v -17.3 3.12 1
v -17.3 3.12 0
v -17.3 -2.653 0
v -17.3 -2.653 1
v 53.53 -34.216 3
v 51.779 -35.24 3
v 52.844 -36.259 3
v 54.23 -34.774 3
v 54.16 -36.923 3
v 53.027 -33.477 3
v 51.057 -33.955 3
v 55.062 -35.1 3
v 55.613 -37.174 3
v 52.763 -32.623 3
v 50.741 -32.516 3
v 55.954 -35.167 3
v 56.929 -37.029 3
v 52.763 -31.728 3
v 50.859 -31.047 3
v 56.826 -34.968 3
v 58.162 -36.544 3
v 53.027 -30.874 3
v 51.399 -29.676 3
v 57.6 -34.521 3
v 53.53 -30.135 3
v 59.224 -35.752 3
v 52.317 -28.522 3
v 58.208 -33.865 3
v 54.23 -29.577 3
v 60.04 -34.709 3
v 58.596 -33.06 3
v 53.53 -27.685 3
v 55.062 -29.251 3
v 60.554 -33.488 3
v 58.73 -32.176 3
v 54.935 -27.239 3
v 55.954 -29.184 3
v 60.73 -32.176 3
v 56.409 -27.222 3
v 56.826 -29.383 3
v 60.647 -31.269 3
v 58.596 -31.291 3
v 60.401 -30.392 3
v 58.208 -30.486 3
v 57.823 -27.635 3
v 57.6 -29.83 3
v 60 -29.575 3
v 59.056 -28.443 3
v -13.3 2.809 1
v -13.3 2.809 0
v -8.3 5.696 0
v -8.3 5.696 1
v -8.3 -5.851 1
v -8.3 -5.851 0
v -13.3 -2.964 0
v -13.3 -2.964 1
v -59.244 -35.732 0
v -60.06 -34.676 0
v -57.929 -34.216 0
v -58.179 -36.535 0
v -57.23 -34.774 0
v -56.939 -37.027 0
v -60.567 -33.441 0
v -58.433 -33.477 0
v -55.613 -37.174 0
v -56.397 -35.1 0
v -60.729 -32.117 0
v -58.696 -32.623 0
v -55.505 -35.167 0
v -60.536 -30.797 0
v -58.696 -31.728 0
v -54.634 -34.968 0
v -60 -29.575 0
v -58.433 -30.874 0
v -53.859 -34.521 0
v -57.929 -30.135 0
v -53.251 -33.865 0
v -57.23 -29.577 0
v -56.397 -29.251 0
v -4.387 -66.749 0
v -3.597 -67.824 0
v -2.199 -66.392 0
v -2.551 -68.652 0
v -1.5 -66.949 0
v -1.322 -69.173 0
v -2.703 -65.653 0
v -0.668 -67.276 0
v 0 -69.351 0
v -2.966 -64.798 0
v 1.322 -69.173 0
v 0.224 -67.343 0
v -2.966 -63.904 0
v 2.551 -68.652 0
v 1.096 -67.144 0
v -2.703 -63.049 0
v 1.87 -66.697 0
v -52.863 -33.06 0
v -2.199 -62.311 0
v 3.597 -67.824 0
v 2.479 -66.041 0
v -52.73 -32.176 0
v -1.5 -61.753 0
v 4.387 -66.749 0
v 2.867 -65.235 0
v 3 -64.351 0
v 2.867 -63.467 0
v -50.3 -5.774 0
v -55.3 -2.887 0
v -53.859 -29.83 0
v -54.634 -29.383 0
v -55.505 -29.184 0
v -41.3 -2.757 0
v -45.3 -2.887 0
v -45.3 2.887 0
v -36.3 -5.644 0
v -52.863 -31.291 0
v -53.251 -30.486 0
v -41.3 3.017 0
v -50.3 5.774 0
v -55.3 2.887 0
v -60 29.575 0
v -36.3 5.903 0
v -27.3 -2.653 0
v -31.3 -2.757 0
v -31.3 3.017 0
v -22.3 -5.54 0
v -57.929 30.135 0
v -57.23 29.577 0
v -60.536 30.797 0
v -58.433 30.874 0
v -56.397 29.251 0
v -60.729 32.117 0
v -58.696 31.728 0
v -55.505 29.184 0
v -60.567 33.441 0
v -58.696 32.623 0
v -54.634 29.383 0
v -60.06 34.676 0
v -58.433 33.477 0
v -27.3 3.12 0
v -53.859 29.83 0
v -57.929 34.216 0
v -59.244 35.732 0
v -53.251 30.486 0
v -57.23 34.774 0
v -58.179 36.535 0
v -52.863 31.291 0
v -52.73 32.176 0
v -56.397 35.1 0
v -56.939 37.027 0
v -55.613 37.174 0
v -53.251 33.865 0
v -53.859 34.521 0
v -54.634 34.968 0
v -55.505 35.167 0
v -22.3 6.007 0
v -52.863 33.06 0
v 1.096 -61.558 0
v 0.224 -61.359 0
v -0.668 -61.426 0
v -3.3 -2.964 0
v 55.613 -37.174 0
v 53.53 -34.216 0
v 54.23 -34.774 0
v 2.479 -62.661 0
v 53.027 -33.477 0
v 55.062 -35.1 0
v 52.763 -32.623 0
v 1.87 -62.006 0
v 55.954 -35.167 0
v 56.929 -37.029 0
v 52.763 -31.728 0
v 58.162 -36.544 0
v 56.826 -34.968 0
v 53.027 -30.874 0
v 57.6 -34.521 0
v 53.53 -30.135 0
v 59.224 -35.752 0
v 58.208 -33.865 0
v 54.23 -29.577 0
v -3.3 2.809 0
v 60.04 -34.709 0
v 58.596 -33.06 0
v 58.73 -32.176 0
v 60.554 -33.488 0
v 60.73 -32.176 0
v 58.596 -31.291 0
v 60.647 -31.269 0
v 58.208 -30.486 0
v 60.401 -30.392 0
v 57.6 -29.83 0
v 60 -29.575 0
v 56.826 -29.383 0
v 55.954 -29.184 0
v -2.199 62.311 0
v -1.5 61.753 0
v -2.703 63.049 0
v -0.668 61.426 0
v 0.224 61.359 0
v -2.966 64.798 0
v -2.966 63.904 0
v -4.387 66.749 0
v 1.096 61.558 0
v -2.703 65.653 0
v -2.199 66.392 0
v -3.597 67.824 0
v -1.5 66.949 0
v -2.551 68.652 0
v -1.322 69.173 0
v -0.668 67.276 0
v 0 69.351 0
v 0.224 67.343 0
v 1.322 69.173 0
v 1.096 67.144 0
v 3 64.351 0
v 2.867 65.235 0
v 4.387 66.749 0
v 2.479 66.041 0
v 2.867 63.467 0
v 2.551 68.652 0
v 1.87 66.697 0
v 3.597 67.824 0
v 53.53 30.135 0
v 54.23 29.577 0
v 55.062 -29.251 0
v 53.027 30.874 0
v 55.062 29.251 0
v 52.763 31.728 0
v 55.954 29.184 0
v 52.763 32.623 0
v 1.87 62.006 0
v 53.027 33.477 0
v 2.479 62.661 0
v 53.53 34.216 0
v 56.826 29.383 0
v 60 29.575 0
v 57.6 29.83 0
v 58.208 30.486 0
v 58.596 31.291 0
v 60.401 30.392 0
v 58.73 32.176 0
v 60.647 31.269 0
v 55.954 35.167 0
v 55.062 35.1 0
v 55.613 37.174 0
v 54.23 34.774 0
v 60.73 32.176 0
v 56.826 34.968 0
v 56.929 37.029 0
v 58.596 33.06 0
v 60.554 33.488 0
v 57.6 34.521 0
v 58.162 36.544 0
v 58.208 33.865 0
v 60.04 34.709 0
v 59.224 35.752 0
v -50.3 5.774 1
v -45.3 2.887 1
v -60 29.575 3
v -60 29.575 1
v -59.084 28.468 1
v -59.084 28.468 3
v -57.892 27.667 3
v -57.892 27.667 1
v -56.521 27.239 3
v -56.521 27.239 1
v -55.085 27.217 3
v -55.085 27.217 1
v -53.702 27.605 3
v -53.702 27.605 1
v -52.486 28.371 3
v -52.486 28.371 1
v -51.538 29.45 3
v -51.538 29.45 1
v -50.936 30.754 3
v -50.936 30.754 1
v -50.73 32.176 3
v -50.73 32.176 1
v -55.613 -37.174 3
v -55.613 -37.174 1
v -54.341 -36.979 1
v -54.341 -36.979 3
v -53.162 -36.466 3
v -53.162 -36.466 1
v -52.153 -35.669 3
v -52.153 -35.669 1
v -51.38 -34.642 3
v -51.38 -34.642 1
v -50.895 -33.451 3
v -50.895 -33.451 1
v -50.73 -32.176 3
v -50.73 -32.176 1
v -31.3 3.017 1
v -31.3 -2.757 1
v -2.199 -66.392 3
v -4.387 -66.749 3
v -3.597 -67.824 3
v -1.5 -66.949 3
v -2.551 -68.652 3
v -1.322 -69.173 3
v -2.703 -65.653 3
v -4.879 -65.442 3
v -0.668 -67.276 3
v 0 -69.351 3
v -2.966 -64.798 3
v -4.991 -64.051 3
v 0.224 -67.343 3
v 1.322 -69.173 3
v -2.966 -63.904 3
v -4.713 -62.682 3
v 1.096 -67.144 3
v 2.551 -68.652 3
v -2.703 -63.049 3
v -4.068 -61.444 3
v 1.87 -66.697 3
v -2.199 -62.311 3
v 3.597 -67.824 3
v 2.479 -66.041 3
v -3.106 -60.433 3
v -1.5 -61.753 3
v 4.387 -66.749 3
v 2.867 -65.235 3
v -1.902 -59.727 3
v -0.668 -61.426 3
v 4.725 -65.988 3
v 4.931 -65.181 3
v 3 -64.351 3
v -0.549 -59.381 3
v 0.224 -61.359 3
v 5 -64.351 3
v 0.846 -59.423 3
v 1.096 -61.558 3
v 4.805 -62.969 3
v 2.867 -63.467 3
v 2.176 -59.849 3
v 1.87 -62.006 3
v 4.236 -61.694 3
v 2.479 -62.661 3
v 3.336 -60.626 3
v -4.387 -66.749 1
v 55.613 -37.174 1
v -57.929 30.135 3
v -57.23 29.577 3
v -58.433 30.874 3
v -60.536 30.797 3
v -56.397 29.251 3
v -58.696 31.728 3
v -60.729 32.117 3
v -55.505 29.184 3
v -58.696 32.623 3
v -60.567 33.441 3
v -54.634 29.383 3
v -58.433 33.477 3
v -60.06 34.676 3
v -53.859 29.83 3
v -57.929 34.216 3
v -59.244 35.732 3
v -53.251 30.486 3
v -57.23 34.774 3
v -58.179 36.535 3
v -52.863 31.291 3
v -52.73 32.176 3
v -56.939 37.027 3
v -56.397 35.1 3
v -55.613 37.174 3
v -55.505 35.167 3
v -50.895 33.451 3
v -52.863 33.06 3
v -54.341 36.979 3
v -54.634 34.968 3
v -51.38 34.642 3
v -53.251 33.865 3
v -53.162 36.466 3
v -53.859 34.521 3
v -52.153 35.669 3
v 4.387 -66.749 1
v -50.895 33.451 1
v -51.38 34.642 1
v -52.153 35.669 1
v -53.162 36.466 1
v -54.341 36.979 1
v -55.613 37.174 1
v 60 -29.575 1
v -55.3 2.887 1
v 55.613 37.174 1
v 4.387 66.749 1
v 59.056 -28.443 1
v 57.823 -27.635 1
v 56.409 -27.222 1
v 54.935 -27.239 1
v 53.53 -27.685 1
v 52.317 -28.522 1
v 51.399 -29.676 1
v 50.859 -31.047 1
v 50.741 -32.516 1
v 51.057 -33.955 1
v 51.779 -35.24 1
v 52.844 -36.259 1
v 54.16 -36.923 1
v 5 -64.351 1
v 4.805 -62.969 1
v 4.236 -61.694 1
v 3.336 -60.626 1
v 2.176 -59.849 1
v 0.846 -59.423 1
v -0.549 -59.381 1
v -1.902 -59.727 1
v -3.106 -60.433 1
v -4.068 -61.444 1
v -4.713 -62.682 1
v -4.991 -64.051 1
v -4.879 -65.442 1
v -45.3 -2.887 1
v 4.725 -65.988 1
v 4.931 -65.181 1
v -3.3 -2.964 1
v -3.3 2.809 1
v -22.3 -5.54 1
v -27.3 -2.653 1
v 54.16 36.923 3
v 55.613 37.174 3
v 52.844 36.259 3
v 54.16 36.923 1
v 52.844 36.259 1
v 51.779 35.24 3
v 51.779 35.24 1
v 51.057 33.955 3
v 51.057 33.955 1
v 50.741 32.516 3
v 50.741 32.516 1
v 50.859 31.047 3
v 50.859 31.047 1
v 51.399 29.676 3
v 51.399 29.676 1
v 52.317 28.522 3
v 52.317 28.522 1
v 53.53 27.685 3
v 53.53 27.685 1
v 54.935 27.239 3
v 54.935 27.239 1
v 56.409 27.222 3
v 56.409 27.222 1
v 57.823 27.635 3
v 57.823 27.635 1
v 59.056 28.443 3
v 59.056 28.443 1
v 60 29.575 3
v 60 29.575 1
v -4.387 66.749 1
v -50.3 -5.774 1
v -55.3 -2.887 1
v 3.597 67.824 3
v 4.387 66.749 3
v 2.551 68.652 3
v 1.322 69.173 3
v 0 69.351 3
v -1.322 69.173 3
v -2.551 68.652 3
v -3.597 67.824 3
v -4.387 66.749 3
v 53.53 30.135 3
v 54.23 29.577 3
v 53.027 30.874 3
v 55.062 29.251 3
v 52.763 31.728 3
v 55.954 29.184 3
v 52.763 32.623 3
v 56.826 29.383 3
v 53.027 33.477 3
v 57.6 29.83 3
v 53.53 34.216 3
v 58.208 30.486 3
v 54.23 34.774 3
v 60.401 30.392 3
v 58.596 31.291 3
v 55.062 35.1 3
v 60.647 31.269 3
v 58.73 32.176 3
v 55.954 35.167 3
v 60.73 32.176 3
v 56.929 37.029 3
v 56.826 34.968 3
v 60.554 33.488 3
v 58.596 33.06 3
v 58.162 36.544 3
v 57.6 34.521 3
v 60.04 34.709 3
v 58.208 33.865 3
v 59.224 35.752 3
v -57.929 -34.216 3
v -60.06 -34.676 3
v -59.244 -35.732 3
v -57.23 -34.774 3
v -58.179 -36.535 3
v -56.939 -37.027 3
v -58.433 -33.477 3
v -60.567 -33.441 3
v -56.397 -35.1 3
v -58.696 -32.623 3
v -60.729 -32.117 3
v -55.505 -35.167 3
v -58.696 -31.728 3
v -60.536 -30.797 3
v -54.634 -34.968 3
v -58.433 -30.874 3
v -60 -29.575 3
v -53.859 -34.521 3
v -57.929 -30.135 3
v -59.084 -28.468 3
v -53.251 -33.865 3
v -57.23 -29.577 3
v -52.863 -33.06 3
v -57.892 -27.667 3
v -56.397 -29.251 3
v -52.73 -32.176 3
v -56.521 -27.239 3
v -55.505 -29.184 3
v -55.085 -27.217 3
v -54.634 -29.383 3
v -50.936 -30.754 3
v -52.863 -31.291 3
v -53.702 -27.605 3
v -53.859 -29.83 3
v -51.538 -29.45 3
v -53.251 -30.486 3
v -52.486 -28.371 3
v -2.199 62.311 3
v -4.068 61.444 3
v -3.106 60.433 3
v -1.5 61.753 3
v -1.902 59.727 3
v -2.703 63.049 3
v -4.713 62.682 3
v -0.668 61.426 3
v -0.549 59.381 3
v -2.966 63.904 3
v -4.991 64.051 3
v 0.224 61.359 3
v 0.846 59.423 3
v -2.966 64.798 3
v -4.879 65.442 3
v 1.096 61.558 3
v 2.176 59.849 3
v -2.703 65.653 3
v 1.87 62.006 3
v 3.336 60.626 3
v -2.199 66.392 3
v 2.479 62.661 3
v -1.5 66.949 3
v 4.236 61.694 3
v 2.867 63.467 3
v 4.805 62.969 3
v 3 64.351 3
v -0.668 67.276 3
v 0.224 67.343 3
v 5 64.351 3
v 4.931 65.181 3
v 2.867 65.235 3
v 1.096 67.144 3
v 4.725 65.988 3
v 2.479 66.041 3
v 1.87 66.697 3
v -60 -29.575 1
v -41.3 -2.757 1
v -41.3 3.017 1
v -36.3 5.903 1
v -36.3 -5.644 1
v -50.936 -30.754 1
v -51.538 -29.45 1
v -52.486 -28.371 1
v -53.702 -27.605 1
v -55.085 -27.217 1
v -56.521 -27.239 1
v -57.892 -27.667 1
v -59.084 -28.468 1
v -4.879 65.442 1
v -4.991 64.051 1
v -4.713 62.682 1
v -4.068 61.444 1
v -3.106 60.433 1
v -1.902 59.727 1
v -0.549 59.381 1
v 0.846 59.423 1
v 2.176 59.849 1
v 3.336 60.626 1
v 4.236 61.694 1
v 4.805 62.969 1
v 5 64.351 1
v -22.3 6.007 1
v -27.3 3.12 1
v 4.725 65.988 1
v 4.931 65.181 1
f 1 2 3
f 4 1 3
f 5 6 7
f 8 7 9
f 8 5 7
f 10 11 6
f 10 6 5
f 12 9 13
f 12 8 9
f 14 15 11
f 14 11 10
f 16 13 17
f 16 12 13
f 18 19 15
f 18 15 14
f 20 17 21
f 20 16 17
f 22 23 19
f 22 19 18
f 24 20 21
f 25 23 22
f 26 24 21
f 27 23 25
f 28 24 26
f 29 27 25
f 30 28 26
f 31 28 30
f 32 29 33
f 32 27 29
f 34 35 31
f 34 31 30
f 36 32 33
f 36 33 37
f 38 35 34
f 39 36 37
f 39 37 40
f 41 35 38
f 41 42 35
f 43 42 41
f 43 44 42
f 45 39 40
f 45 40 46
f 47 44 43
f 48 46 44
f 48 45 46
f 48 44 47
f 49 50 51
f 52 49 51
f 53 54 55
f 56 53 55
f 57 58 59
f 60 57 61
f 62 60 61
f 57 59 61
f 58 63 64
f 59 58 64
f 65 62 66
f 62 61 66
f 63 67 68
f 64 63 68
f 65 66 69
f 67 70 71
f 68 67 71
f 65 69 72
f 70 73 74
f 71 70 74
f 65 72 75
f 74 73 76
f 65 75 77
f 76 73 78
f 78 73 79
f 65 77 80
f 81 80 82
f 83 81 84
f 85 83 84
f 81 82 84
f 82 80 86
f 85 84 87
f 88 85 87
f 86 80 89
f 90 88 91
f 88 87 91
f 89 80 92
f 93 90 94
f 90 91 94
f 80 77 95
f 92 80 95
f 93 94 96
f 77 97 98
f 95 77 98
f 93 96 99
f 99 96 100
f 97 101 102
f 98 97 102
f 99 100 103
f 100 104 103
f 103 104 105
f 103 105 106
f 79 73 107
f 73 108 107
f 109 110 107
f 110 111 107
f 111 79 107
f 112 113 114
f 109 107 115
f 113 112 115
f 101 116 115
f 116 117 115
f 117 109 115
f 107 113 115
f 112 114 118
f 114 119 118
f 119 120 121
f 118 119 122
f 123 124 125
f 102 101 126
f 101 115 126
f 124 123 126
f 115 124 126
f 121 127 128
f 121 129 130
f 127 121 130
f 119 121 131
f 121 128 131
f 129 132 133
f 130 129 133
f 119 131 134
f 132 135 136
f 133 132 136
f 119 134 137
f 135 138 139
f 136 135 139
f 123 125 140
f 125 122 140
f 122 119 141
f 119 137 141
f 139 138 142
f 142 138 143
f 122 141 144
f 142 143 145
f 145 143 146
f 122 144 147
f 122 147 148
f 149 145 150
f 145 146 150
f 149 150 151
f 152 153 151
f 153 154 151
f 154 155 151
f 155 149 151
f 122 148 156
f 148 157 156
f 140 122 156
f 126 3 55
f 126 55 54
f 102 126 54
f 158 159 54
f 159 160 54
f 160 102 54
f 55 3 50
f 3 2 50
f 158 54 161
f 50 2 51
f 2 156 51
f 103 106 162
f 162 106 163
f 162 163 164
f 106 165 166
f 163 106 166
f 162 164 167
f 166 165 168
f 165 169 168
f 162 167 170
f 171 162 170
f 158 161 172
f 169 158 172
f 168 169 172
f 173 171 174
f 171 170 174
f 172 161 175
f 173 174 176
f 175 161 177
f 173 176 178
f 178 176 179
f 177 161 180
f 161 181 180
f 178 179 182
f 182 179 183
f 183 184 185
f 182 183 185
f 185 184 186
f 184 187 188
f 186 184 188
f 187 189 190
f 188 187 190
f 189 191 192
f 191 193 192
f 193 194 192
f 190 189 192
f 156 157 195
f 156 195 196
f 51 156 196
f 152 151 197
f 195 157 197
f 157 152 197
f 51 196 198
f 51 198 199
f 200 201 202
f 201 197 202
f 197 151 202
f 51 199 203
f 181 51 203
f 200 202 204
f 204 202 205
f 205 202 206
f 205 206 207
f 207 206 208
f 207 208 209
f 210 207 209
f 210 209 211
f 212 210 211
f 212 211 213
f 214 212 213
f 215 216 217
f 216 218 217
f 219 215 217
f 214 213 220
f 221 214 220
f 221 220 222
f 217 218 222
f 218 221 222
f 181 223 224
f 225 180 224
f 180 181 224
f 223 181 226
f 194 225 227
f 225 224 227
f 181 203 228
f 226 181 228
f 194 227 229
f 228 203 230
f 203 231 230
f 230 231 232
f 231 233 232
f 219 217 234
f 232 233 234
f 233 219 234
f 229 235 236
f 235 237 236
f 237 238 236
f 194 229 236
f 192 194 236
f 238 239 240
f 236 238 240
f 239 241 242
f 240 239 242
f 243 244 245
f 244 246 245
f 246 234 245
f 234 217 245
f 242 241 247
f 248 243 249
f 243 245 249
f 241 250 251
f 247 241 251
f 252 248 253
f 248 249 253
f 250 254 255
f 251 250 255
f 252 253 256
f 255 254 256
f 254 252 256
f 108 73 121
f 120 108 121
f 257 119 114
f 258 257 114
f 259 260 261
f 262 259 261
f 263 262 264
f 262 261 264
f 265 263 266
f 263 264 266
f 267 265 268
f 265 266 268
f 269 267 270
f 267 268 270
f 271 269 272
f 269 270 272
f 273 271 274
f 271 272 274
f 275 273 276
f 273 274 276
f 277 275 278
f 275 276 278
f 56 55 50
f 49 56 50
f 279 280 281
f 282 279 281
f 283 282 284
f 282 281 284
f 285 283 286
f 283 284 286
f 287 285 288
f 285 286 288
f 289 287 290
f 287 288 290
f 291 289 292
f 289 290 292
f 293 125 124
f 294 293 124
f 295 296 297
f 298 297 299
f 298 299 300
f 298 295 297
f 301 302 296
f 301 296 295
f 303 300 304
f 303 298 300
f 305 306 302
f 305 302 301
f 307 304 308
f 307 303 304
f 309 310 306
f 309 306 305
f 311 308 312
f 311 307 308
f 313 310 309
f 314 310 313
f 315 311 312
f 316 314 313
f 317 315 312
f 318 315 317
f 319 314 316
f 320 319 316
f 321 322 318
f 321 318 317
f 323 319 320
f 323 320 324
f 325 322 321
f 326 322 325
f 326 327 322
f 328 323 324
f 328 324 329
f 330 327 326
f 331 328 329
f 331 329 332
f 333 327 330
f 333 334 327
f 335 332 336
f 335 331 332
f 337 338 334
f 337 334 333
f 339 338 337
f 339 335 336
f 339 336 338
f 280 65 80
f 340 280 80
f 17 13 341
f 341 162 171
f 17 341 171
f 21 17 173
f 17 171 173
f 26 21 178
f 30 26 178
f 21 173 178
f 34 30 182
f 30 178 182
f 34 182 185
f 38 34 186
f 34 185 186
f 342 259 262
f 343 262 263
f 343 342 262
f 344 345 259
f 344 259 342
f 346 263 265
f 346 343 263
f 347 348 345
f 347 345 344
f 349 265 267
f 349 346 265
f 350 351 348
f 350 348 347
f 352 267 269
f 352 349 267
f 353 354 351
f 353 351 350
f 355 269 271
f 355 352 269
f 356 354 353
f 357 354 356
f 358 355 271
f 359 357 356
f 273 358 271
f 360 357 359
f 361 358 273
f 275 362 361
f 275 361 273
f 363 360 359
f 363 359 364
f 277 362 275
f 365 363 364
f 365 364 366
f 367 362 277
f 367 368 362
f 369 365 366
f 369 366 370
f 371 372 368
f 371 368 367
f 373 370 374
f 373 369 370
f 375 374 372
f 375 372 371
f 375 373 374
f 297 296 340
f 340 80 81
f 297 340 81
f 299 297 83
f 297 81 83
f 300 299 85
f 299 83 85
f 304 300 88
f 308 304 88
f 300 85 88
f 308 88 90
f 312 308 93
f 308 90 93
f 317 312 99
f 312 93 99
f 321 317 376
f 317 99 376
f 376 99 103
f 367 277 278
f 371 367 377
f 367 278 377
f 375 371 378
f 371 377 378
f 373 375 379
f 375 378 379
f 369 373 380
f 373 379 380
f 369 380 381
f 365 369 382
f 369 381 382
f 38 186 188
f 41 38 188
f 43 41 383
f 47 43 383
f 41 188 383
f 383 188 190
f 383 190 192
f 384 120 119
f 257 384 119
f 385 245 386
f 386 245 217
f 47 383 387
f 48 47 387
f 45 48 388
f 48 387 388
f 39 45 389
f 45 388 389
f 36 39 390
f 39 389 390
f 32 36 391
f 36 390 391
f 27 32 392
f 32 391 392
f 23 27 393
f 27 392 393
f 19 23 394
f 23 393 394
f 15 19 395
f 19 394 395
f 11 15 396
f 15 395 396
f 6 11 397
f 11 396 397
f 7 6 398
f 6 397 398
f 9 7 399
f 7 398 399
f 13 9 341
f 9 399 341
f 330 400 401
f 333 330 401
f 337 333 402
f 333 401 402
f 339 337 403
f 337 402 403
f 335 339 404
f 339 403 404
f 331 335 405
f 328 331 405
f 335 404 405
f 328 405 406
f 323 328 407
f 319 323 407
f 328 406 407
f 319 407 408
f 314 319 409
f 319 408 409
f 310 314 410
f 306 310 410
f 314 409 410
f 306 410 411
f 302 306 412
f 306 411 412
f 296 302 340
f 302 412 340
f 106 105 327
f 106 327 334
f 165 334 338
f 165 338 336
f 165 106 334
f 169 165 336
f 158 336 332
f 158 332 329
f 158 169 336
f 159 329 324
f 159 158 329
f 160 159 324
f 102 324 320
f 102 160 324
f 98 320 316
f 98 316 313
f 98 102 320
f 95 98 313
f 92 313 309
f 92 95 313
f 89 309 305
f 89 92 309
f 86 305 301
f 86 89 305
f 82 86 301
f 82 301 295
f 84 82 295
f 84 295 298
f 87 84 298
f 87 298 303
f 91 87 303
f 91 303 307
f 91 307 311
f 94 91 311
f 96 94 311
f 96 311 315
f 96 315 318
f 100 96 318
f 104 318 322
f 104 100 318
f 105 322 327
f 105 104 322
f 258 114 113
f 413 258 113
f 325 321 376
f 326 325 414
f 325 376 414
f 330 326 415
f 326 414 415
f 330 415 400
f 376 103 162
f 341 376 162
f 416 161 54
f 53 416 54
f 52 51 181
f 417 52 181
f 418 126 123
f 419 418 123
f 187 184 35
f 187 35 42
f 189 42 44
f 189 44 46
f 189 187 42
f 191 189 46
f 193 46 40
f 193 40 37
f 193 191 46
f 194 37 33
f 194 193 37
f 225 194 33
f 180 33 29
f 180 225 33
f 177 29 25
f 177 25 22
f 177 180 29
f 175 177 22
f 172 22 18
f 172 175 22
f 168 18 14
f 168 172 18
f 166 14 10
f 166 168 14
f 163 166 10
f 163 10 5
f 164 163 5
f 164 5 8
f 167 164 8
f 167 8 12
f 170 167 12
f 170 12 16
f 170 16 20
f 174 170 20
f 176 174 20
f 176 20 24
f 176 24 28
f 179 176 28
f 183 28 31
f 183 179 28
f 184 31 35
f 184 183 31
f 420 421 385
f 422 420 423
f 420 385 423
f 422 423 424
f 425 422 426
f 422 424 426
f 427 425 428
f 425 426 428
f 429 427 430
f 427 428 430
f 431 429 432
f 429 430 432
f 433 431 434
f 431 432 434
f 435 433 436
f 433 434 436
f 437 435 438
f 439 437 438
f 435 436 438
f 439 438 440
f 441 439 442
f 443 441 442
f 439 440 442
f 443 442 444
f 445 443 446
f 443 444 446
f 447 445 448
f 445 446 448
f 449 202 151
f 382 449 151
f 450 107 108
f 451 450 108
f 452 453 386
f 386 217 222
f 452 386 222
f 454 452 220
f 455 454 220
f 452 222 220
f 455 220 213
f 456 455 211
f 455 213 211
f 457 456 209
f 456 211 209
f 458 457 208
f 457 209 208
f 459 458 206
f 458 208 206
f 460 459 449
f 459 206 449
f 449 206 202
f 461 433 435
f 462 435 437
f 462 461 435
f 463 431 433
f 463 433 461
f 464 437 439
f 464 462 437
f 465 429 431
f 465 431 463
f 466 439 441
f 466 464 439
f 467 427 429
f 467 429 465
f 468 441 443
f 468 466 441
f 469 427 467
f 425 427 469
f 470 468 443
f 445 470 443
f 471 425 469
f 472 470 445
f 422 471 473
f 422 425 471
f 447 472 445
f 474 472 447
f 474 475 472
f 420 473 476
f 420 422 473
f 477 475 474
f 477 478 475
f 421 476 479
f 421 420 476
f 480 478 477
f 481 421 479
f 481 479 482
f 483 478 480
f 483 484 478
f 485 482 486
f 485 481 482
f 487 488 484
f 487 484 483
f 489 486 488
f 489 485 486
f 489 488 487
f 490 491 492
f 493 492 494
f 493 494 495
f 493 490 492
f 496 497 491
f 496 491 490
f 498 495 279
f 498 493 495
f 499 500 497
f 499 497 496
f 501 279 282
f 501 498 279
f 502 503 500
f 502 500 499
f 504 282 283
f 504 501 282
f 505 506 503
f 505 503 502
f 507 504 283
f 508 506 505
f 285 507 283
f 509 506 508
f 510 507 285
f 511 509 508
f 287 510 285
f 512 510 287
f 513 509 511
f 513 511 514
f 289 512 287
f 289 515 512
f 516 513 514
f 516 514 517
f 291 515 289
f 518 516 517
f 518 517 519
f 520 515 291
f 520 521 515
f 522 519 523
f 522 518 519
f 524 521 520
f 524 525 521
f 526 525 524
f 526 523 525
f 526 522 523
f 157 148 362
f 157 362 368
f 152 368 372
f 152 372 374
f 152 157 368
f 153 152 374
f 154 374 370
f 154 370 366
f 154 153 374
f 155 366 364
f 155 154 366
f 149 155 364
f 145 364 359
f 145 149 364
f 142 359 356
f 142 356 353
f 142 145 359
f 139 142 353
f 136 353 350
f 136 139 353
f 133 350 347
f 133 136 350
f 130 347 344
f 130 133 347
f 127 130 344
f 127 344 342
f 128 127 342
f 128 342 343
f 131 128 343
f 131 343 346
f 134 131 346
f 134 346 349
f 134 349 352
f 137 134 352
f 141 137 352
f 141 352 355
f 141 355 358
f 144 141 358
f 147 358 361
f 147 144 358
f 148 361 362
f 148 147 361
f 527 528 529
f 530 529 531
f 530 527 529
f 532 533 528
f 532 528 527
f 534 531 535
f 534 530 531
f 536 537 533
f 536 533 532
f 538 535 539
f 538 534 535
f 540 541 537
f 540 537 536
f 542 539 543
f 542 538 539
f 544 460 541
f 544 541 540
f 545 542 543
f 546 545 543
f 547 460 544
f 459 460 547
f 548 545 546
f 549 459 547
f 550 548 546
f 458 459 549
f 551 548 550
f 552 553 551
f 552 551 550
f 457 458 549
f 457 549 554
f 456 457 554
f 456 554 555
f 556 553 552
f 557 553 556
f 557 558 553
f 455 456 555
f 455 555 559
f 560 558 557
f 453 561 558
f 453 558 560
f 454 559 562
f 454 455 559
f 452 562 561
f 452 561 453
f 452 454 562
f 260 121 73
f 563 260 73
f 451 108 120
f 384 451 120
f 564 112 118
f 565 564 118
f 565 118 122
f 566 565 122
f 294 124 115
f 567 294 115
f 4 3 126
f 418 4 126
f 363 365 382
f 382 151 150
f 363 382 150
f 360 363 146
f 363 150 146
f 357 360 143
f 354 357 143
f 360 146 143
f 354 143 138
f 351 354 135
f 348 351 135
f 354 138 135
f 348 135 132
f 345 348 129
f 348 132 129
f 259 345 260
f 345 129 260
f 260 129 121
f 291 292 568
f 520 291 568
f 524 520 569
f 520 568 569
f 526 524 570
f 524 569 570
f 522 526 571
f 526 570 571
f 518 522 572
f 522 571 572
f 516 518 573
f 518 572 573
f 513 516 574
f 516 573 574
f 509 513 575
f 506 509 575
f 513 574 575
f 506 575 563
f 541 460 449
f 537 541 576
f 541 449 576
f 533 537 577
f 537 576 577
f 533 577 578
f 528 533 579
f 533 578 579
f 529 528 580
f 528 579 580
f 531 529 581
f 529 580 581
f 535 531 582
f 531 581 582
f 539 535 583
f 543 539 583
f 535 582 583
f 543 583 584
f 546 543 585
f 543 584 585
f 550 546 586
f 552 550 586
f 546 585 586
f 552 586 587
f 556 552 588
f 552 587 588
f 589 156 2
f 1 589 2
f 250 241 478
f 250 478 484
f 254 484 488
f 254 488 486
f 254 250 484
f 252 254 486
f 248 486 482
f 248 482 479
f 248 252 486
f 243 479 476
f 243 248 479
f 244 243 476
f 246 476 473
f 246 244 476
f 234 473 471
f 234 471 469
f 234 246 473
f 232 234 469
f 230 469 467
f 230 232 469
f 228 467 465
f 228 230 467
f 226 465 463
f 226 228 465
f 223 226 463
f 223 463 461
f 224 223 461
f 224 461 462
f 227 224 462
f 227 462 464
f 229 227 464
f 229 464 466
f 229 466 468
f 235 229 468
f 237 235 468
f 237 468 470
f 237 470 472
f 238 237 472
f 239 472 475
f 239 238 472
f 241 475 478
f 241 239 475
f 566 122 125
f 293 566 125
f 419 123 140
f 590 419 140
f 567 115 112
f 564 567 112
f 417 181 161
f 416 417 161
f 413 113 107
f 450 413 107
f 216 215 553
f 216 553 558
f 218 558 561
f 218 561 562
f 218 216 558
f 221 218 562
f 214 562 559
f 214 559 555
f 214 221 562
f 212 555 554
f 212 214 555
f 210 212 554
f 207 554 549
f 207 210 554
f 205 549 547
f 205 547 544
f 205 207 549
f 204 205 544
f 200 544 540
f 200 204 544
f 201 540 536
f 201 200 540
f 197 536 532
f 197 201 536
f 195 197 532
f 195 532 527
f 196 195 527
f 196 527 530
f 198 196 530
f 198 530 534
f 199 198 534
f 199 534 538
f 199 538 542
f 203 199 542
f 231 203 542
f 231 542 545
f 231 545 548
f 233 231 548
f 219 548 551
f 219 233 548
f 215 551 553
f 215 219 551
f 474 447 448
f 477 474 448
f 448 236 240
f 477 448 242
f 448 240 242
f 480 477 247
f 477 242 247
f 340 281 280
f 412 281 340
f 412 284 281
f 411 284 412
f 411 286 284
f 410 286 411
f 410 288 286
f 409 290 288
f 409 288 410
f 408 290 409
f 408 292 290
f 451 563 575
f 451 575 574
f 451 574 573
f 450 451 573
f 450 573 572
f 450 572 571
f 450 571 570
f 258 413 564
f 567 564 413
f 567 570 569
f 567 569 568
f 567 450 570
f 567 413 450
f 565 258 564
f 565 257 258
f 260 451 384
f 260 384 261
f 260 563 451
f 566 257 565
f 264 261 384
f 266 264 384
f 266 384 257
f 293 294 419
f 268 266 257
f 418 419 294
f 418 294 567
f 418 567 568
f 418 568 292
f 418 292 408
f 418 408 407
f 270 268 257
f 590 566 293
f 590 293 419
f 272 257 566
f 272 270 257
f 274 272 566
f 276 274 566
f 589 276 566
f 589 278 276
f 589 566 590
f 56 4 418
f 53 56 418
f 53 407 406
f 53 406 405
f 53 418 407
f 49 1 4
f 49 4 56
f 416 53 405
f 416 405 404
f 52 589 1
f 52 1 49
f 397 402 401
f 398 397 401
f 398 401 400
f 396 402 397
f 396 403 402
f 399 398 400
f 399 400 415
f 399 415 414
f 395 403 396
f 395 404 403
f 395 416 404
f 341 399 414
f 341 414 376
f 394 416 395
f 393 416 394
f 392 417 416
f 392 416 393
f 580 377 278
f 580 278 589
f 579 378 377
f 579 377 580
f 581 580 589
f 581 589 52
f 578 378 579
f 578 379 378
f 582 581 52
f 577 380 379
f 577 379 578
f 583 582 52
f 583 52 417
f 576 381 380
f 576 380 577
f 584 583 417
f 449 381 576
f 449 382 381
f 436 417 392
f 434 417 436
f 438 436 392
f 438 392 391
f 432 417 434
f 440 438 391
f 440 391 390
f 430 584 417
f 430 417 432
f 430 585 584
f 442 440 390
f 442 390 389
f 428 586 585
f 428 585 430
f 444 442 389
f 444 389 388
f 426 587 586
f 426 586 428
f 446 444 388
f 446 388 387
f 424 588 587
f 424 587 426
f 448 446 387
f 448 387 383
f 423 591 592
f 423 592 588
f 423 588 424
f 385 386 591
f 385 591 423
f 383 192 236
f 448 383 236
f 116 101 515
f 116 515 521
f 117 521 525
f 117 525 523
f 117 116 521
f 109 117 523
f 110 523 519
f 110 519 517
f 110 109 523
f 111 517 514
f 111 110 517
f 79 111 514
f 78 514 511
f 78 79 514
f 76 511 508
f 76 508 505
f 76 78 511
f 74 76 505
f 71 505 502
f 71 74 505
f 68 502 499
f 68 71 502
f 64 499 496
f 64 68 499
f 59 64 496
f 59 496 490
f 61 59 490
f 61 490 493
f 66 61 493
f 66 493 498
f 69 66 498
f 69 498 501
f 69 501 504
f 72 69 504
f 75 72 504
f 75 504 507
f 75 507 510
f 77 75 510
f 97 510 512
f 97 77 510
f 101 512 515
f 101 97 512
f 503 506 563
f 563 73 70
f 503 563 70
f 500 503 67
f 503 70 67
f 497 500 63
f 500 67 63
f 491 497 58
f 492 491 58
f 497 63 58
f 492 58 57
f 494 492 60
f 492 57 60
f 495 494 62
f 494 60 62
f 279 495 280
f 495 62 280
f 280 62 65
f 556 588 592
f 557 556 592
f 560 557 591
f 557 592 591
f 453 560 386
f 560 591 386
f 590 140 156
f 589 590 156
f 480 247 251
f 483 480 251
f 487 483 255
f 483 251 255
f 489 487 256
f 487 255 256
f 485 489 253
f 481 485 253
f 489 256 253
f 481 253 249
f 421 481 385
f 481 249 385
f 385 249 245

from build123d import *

# Parameters (mm, degrees)
F1_DEPTH = 1
F0_R     = 3
F2_DEPTH = 3


with BuildPart() as f1:
    # F0 (on Top) → F1 (new body)
    with BuildSketch(Plane.XY):
        with BuildLine():
            Line((60, -29.5747704777), (60, 29.574769431))
            ThreePointArc((60, 29.574769431), (51.3994928411, 29.6755110105), (55.6125027826, 37.1741388509))
            Line((55.6125027826, 37.1741388509), (4.3874976328, 66.7489093634))
            ThreePointArc((4.3874976328, 66.7489093634), (4.844454983, 65.5884611093), (5, 64.351021851))
            ThreePointArc((5, 64.351021851), (-1.2374392583, 59.506566868), (-4.3874976328, 66.7489093634))
            Line((-4.3874976328, 66.7489093634), (-55.6125023294, 37.1741391126))
            ThreePointArc((-55.6125023294, 37.1741391126), (-52.1529183527, 35.6693921891), (-50.7296198931, 32.1755109531))
            ThreePointArc((-50.7296198931, 32.1755109531), (-54.37904604, 27.3613702959), (-60, 29.5747699543))
            Line((-60, 29.5747699543), (-60, -29.5747699543))
            ThreePointArc((-60, -29.5747699543), (-54.3790460573, -27.3613707384), (-50.7296201258, -32.1755113351))
            ThreePointArc((-50.7296201258, -32.1755113351), (-52.152918285, -35.6693922636), (-55.6125017026, -37.1741394744))
            Line((-55.6125017026, -37.1741394744), (-4.3874984862, -66.7489088707))
            ThreePointArc((-4.3874984862, -66.7489088707), (-1.237438708, -59.5065674728), (4.9999998449, -64.351022636))
            ThreePointArc((4.9999998449, -64.351022636), (4.8444549712, -65.5884613333), (4.387498033, -66.7489091323))
            Line((4.387498033, -66.7489091323), (55.6125012494, -37.1741397361))
            ThreePointArc((55.6125012494, -37.1741397361), (51.3994931648, -29.6755112347), (60, -29.5747704777))
        make_face()
        Polygon((-8.3002293408, -5.8508351856), (-13.3002293408, -2.9640838396), (-13.3002293408, 2.8094188523), (-8.3002293408, 5.6961701982), (-3.3002293408, 2.8094188523), (-3.3002293408, -2.9640838396), align=None, mode=Mode.SUBTRACT)
        Polygon((-50.3002293408, 5.7735026919), (-45.3002293408, 2.8867513459), (-45.3002293408, -2.8867513459), (-50.3002293408, -5.7735026919), (-55.3002293408, -2.8867513459), (-55.3002293408, 2.8867513459), align=None, mode=Mode.SUBTRACT)
        Polygon((-36.3002293408, -5.6435510621), (-41.3002293408, -2.7567997162), (-41.3002293408, 3.0167029757), (-36.3002293408, 5.9034543217), (-31.3002293408, 3.0167029757), (-31.3002293408, -2.7567997162), align=None, mode=Mode.SUBTRACT)
        Polygon((-22.3002293408, -5.5399089458), (-27.3002293408, -2.6531575999), (-27.3002293408, 3.120345092), (-22.3002293408, 6.007096438), (-17.3002293408, 3.120345092), (-17.3002293408, -2.6531575999), align=None, mode=Mode.SUBTRACT)
    extrude(amount=F1_DEPTH)

    # F0 (on Top) → F2 (join)
    with BuildSketch(Plane.XY):
        with BuildLine():
            ThreePointArc((-50.7296198931, 32.1755109531), (-52.1529183527, 35.6693921891), (-55.6125023294, 37.1741391126))
            ThreePointArc((-55.6125023294, 37.1741391126), (-60.0597469512, 34.6755108854), (-60, 29.5747699543))
            ThreePointArc((-60, 29.5747699543), (-54.37904604, 27.3613702959), (-50.7296198931, 32.1755109531))
        make_face()
        with Locations((-55.7296198931, 32.1755109531)):
            Circle(F0_R, mode=Mode.SUBTRACT)
        with BuildLine():
            ThreePointArc((5, 64.351021851), (4.844454983, 65.5884611093), (4.3874976328, 66.7489093634))
            ThreePointArc((4.3874976328, 66.7489093634), (0, 69.351021851), (-4.3874976328, 66.7489093634))
            ThreePointArc((-4.3874976328, 66.7489093634), (-1.2374392583, 59.506566868), (5, 64.351021851))
        make_face()
        with Locations((0, 64.351021851)):
            Circle(F0_R, mode=Mode.SUBTRACT)
        with BuildLine():
            ThreePointArc((55.6125027826, 37.1741388509), (51.3994928411, 29.6755110105), (60, 29.574769431))
            ThreePointArc((60, 29.574769431), (60.5437606651, 30.8249366878), (60.7296200482, 32.1755106845))
            ThreePointArc((60.7296200482, 32.1755106845), (59.2235013908, 35.7522121207), (55.6125027826, 37.1741388509))
        make_face()
        with Locations((55.7296200482, 32.1755106845)):
            Circle(F0_R, mode=Mode.SUBTRACT)
        with BuildLine():
            ThreePointArc((60.7296199707, -32.1755116038), (60.5437606077, -30.8249376789), (60, -29.5747704777))
            ThreePointArc((60, -29.5747704777), (51.3994931648, -29.6755112347), (55.6125012494, -37.1741397361))
            ThreePointArc((55.6125012494, -37.1741397361), (59.2235007925, -35.7522135487), (60.7296199707, -32.1755116038))
        make_face()
        with Locations((55.7296199707, -32.1755116038)):
            Circle(F0_R, mode=Mode.SUBTRACT)
        with BuildLine():
            ThreePointArc((-4.3874984862, -66.7489088707), (-3.042e-07, -69.351022636), (4.387498033, -66.7489091323))
            ThreePointArc((4.387498033, -66.7489091323), (4.8444549712, -65.5884613333), (4.9999998449, -64.351022636))
            ThreePointArc((4.9999998449, -64.351022636), (-1.237438708, -59.5065674728), (-4.3874984862, -66.7489088707))
        make_face()
        with Locations((-1.551e-07, -64.351022636)):
            Circle(F0_R, mode=Mode.SUBTRACT)
        with BuildLine():
            ThreePointArc((-60, -29.5747699543), (-60.0597470807, -34.6755114459), (-55.6125017026, -37.1741394744))
            ThreePointArc((-55.6125017026, -37.1741394744), (-52.152918285, -35.6693922636), (-50.7296201258, -32.1755113351))
            ThreePointArc((-50.7296201258, -32.1755113351), (-54.3790460573, -27.3613707384), (-60, -29.5747699543))
        make_face()
        with Locations((-55.7296201258, -32.1755113351)):
            Circle(F0_R, mode=Mode.SUBTRACT)
    extrude(amount=F2_DEPTH)


solid = f1.part
